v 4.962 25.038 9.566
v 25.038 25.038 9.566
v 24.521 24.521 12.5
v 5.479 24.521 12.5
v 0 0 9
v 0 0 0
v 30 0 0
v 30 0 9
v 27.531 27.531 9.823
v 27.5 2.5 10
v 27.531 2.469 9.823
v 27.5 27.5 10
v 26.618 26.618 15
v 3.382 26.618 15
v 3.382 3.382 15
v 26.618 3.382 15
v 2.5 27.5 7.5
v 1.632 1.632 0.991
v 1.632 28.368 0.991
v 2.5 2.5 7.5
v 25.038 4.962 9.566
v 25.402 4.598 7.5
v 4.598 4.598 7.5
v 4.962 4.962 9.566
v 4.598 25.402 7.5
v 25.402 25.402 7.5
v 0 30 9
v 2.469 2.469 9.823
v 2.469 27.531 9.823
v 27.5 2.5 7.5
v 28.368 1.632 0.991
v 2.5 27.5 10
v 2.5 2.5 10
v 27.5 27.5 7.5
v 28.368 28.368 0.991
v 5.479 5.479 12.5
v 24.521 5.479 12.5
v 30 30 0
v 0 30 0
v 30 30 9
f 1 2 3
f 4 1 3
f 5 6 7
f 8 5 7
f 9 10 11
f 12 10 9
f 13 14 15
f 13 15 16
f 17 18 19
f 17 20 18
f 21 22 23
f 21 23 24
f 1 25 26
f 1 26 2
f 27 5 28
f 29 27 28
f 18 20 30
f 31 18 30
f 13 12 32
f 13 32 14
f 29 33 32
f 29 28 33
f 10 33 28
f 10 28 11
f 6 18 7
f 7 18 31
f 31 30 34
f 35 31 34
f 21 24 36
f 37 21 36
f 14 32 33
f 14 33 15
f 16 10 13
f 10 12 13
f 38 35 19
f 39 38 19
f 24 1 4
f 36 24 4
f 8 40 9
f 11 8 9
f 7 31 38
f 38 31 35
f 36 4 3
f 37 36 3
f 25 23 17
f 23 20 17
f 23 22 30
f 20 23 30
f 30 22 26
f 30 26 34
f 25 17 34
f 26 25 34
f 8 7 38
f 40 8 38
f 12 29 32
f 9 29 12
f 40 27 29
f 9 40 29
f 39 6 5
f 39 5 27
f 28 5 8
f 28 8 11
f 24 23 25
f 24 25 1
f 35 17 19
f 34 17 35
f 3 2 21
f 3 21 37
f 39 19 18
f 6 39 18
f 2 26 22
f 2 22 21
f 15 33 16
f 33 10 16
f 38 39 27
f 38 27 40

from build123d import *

# Parameters (mm, degrees)
F0_W          = 30
F0_H          = 30
F1_DEPTH      = 10
F2_T          = -2.5
F3_SIZE2      = 7.49999
F3_SIZE       = 0.99999
F4_W          = 25
F4_H          = 25
F5_DEPTH      = 5
F5_TAPER      = 10
F6_T          = 2.5
F6_T3_DEPTH   = 12.6321563139
F6_T5_DEPTH   = 12.6321563139
F6_T7_DEPTH   = 12.6321563139
F6_T9_DEPTH   = 12.6321563139
F6_T11_DEPTH  = 5.00001
F6_T13_DEPTH  = 30
F6_T15_DEPTH  = 30
F7_T4_DEPTH   = 45.5703660639
F7_T10_DEPTH  = 45.5703660639
F7_T16_DEPTH  = 45.5703660639
F7_T23_DEPTH  = 45.5703660639
F7_T29_DEPTH  = 45.5703660639
F7_T35_DEPTH  = 45.5703660639
F7_T41_DEPTH  = 45.5703660639
F7_T47_DEPTH  = 45.5703660639
F7_T54_DEPTH  = 45.5703660639
F7_T60_DEPTH  = 45.5703660639
F7_T66_DEPTH  = 45.5703660639
F7_T72_DEPTH  = 45.5703660639
F7_T78_DEPTH  = 45.5703660639
F7_T85_DEPTH  = 45.5703660639
F7_T91_DEPTH  = 45.5703660639
F7_T97_DEPTH  = 45.5703660639
F7_T103_DEPTH = 45.5703660639
F7_T109_DEPTH = 45.5703660639
F7_T116_DEPTH = 45.5703660639
F7_T122_DEPTH = 45.5703660639
F8_C1_SIZE2   = 1
F8_C1_SIZE    = 1.5
F8_C2_SIZE2   = 1
F8_C2_SIZE    = 1.5
F8_C3_SIZE2   = 1
F8_C3_SIZE    = 1.5
F8_C4_SIZE2   = 1
F8_C4_SIZE    = 1.5


# Not quite as in the source:
# - a fillet or chamfer that OpenCascade refuses, or shapes differently, is made with other operations: its cross-section is extruded or revolved along the edge and cut away or added
# - a fillet or chamfer is up to 0.001 mm smaller than in the source, because OpenCascade refuses the exact size
# - a shell that OpenCascade refuses in one call is made with other operations: the cavity is built on its own and cut out


with BuildPart() as f1:
    # F0 (on Top) → F1 (new body)
    with BuildSketch(Plane.XY):
        with Locations((15, 15)):
            Rectangle(F0_W, F0_H)
    extrude(amount=F1_DEPTH)

    # F2
    f2_openings = [f1.faces().sort_by_distance(p)[0] for p in [
        (15, 15, 0),
    ]]
    offset(amount=F2_T, openings=f2_openings)

    # F3 (size 1 and 7.5 in the source; OpenCascade refuses exactly that, so slightly less here)
    f3_edges = [f1.edges().sort_by_distance(p)[0] for p in [
        (27.5, 15, 0),
        (15, 27.5, 0),
        (2.5, 15, 0),
        (15, 2.5, 0),
    ]]
    chamfer(f3_edges, length=F3_SIZE, length2=F3_SIZE2)

    # F4 (on face) → F5 (join)
    with BuildSketch(Plane.XY.offset(10)):
        with Locations((15, 15)):
            Rectangle(F4_W, F4_H)
    extrude(amount=F5_DEPTH, taper=F5_TAPER)

    # F6: shell of thickness 2.5, made by hand


with BuildPart() as f6_core1:
    # F6_t2: copy of F1
    add(f1.part)

    # the walls: a layer under each face that stays
    f6_faces = [f6_core1.faces().sort_by_distance(p)[0] for p in [
        (1, 1, 0),
        (27.999995, 15, 3.749995),
        (15, 2.000005, 3.749995),
        (15, 27.999995, 3.749995),
        (2.000005, 15, 3.749995),
        (0, 15, 5),
        (15, 0, 5),
        (30, 15, 5),
        (15, 30, 5),
        (27.5, 15, 7.499995),
        (15, 2.5, 7.499995),
        (15, 27.5, 7.499995),
        (2.5, 15, 7.499995),
        (2.1428571429, 2.1428571429, 10),
        (27.0591825482, 15, 12.5),
        (15, 27.0591825482, 12.5),
        (2.9408174518, 15, 12.5),
        (15, 2.9408174518, 12.5),
        (15, 15, 15),
    ]]
    thicken(f6_faces, amount=-F6_T, mode=Mode.SUBTRACT)

    # F6_s4 → F6_t3 (cut)
    with BuildSketch(Plane(origin=(0.7910693611, -0.7910693611, -5.9330716286), x_dir=(-0.7071067812, -0.7071067812, 0), z_dir=(-0.1310232599, 0.1310232599, 0.9826829655))):
        Polygon((-21.2132034356, 18.7255916199), (-22.9654636265, 20.5443932655), (-21.2132034356, 22.2663095063), (-19.4609432447, 20.5443932655), align=None)
    extrude(amount=F6_T3_DEPTH, mode=Mode.SUBTRACT)

    # F6_s6 → F6_t5 (cut)
    with BuildSketch(Plane(origin=(1.3060821999, 1.3060821999, -9.7957013952), x_dir=(0.7071067812, -0.7071067812, 0), z_dir=(-0.1310232599, -0.1310232599, 0.9826829655))):
        Polygon((0, 39.5714452805), (1.7522601909, 41.3902469261), (0, 43.1121631669), (-1.7522601909, 41.3902469261), align=None)
    extrude(amount=F6_T5_DEPTH, mode=Mode.SUBTRACT)

    # F6_s8 → F6_t7 (cut)
    with BuildSketch(Plane(origin=(-0.2760565224, -0.2760565224, -2.0704418621), x_dir=(-0.7071067812, 0.7071067812, 0), z_dir=(0.1310232599, 0.1310232599, 0.9826829655))):
        Polygon((0, -2.1202620407), (-1.7522601909, -0.3014603951), (0, 1.4204558457), (1.7522601909, -0.3014603951), align=None)
    extrude(amount=F6_T7_DEPTH, mode=Mode.SUBTRACT)

    # F6_s10 → F6_t9 (cut)
    with BuildSketch(Plane(origin=(-0.7910693611, 0.7910693611, -5.9330716286), x_dir=(0.7071067812, 0.7071067812, 0), z_dir=(0.1310232599, -0.1310232599, 0.9826829655))):
        Polygon((21.2132034356, 18.7255916199), (22.9654636265, 20.5443932655), (21.2132034356, 22.2663095063), (19.4609432447, 20.5443932655), align=None)
    extrude(amount=F6_T9_DEPTH, mode=Mode.SUBTRACT)

    # F6_s12 → F6_t11 (cut)
    with BuildSketch(Plane.XY.offset(4.99999)):
        Polygon((27.475, 2.525), (30, 2.5), (30, 0), (27.5, 0), align=None)
        Polygon((27.475, 27.475), (30, 27.5), (30, 30), (27.5, 30), align=None)
        Polygon((2.525, 2.525), (2.5, 0), (0, 0), (0, 2.5), align=None)
        Polygon((2.525, 27.475), (2.5, 30), (0, 30), (0, 27.5), align=None)
    extrude(amount=F6_T11_DEPTH, mode=Mode.SUBTRACT)

    # F6_s14 → F6_t13 (cut)
    with BuildSketch(Plane.XZ.offset(-30)):
        Polygon((27.5246201938, 10.0293412044), (27.5, 7.5), (25.4022509221, 7.5), (25.0379806175, 9.5658795558), align=None)
        Polygon((2.4753798062, 10.0293412044), (2.5, 7.5), (4.5977490779, 7.5), (4.9620193825, 9.5658795558), align=None)
    extrude(amount=F6_T13_DEPTH, mode=Mode.SUBTRACT)

    # F6_s16 → F6_t15 (cut)
    with BuildSketch(Plane.YZ):
        Polygon((27.5246201938, 10.0293412044), (27.5, 7.5), (25.4022509221, 7.5), (25.0379806175, 9.5658795558), align=None)
        Polygon((2.4753798062, 10.0293412044), (2.5, 7.5), (4.5977490779, 7.5), (4.9620193825, 9.5658795558), align=None)
    extrude(amount=F6_T15_DEPTH, mode=Mode.SUBTRACT)


with BuildPart() as f1_1:
    add(f1.part)

    # what is left inside the walls is the cavity
    f6_cavity = [f6_core1.part.solids().sort_by_distance(p)[0] for p in [
        (15, 11.532583, 7.525),
    ]]
    add(f6_cavity, mode=Mode.SUBTRACT)

    # F7: chamfer of 1 x 3 on 4 edges, made by hand


with BuildPart() as f7_tool2:
    # F7_s3 → F7_t4 (new body)
    with BuildSketch(Plane.XZ.offset(7.785183032)):
        Polygon((30, 9), (27, 10), (30, 10), align=None)
    extrude(amount=-F7_T4_DEPTH)

    split(bisect_by=Plane(origin=(28.3808742524, 0, 5.0043138668), x_dir=(0, 1, 0), z_dir=(0.984807753, 0, 0.1736481777)), keep=Keep.TOP)

    split(bisect_by=Plane(origin=(0, 0.7145150594, -0.1259882831), x_dir=(1, 0, 0), z_dir=(0, -0.984807753, 0.1736481777)), keep=Keep.TOP)


with BuildPart() as f1_2:
    add(f1_1.part)

    # F7_t1: cut F7_tool2
    add(f7_tool2.part, mode=Mode.SUBTRACT)


with BuildPart() as f7_tool8:
    # F7_s9 → F7_t10 (new body)
    with BuildSketch(Plane.XZ.offset(7.785183032)):
        Polygon((30, 9), (27, 10), (30, 10), align=None)
    extrude(amount=-F7_T10_DEPTH)

    split(bisect_by=Plane(origin=(28.3808742524, 0, 5.0043138668), x_dir=(0, 1, 0), z_dir=(-0.984807753, 0, -0.1736481777)), keep=Keep.TOP)

    split(bisect_by=Plane(origin=(0, 0.7145150594, -0.1259882831), x_dir=(1, 0, 0), z_dir=(0, -0.984807753, 0.1736481777)), keep=Keep.TOP)


with BuildPart() as f1_3:
    add(f1_2.part)

    # F7_t7: cut F7_tool8
    add(f7_tool8.part, mode=Mode.SUBTRACT)


with BuildPart() as f7_tool14:
    # F7_s15 → F7_t16 (new body)
    with BuildSketch(Plane.XZ.offset(7.785183032)):
        Polygon((30, 9), (27, 10), (30, 10), align=None)
    extrude(amount=-F7_T16_DEPTH)

    split(bisect_by=Plane(origin=(28.3808742524, 0, 5.0043138668), x_dir=(0, 1, 0), z_dir=(0.984807753, 0, 0.1736481777)), keep=Keep.TOP)

    split(bisect_by=Plane(origin=(0, 28.3808742524, 5.0043138668), x_dir=(1, 0, 0), z_dir=(0, -0.984807753, -0.1736481777)), keep=Keep.TOP)

    split(bisect_by=Plane(origin=(0, 0.7145150594, -0.1259882831), x_dir=(1, 0, 0), z_dir=(0, 0.984807753, -0.1736481777)), keep=Keep.TOP)


with BuildPart() as f1_4:
    add(f1_3.part)

    # F7_t13: cut F7_tool14
    add(f7_tool14.part, mode=Mode.SUBTRACT)


with BuildPart() as f7_tool21:
    # F7_s22 → F7_t23 (new body)
    with BuildSketch(Plane.XZ.offset(7.785183032)):
        Polygon((30, 9), (27, 10), (30, 10), align=None)
    extrude(amount=-F7_T23_DEPTH)

    split(bisect_by=Plane(origin=(28.3808742524, 0, 5.0043138668), x_dir=(0, 1, 0), z_dir=(0.984807753, 0, 0.1736481777)), keep=Keep.TOP)

    split(bisect_by=Plane(origin=(0, 28.3808742524, 5.0043138668), x_dir=(1, 0, 0), z_dir=(0, 0.984807753, 0.1736481777)), keep=Keep.TOP)


with BuildPart() as f1_5:
    add(f1_4.part)

    # F7_t20: cut F7_tool21
    add(f7_tool21.part, mode=Mode.SUBTRACT)


with BuildPart() as f7_tool27:
    # F7_s28 → F7_t29 (new body)
    with BuildSketch(Plane.XZ.offset(7.785183032)):
        Polygon((30, 9), (27, 10), (30, 10), align=None)
    extrude(amount=-F7_T29_DEPTH)

    split(bisect_by=Plane(origin=(28.3808742524, 0, 5.0043138668), x_dir=(0, 1, 0), z_dir=(-0.984807753, 0, -0.1736481777)), keep=Keep.TOP)

    split(bisect_by=Plane(origin=(0, 28.3808742524, 5.0043138668), x_dir=(1, 0, 0), z_dir=(0, 0.984807753, 0.1736481777)), keep=Keep.TOP)


with BuildPart() as f1_6:
    add(f1_5.part)

    # F7_t26: cut F7_tool27
    add(f7_tool27.part, mode=Mode.SUBTRACT)


with BuildPart() as f7_tool33:
    # F7_s34 → F7_t35 (new body)
    with BuildSketch(Plane.YZ.offset(-7.785183032)):
        Polygon((0, 9), (3, 10), (0, 10), align=None)
    extrude(amount=F7_T35_DEPTH)

    split(bisect_by=Plane(origin=(0.7145150594, 0, -0.1259882831), x_dir=(0, 1, 0), z_dir=(-0.984807753, 0, 0.1736481777)), keep=Keep.TOP)

    split(bisect_by=Plane(origin=(0, 0.7145150594, -0.1259882831), x_dir=(1, 0, 0), z_dir=(0, -0.984807753, 0.1736481777)), keep=Keep.TOP)


with BuildPart() as f1_7:
    add(f1_6.part)

    # F7_t32: cut F7_tool33
    add(f7_tool33.part, mode=Mode.SUBTRACT)


with BuildPart() as f7_tool39:
    # F7_s40 → F7_t41 (new body)
    with BuildSketch(Plane.YZ.offset(-7.785183032)):
        Polygon((0, 9), (3, 10), (0, 10), align=None)
    extrude(amount=F7_T41_DEPTH)

    split(bisect_by=Plane(origin=(0.7145150594, 0, -0.1259882831), x_dir=(0, 1, 0), z_dir=(-0.984807753, 0, 0.1736481777)), keep=Keep.TOP)

    split(bisect_by=Plane(origin=(0, 0.7145150594, -0.1259882831), x_dir=(1, 0, 0), z_dir=(0, 0.984807753, -0.1736481777)), keep=Keep.TOP)


with BuildPart() as f1_8:
    add(f1_7.part)

    # F7_t38: cut F7_tool39
    add(f7_tool39.part, mode=Mode.SUBTRACT)


with BuildPart() as f7_tool45:
    # F7_s46 → F7_t47 (new body)
    with BuildSketch(Plane.YZ.offset(-7.785183032)):
        Polygon((0, 9), (3, 10), (0, 10), align=None)
    extrude(amount=F7_T47_DEPTH)

    split(bisect_by=Plane(origin=(28.3808742524, 0, 5.0043138668), x_dir=(0, 1, 0), z_dir=(-0.984807753, 0, -0.1736481777)), keep=Keep.TOP)

    split(bisect_by=Plane(origin=(0.7145150594, 0, -0.1259882831), x_dir=(0, 1, 0), z_dir=(0.984807753, 0, -0.1736481777)), keep=Keep.TOP)

    split(bisect_by=Plane(origin=(0, 0.7145150594, -0.1259882831), x_dir=(1, 0, 0), z_dir=(0, -0.984807753, 0.1736481777)), keep=Keep.TOP)


with BuildPart() as f1_9:
    add(f1_8.part)

    # F7_t44: cut F7_tool45
    add(f7_tool45.part, mode=Mode.SUBTRACT)


with BuildPart() as f7_tool52:
    # F7_s53 → F7_t54 (new body)
    with BuildSketch(Plane.YZ.offset(-7.785183032)):
        Polygon((0, 9), (3, 10), (0, 10), align=None)
    extrude(amount=F7_T54_DEPTH)

    split(bisect_by=Plane(origin=(28.3808742524, 0, 5.0043138668), x_dir=(0, 1, 0), z_dir=(0.984807753, 0, 0.1736481777)), keep=Keep.TOP)

    split(bisect_by=Plane(origin=(0, 0.7145150594, -0.1259882831), x_dir=(1, 0, 0), z_dir=(0, -0.984807753, 0.1736481777)), keep=Keep.TOP)


with BuildPart() as f1_10:
    add(f1_9.part)

    # F7_t51: cut F7_tool52
    add(f7_tool52.part, mode=Mode.SUBTRACT)


with BuildPart() as f7_tool58:
    # F7_s59 → F7_t60 (new body)
    with BuildSketch(Plane.YZ.offset(-7.785183032)):
        Polygon((0, 9), (3, 10), (0, 10), align=None)
    extrude(amount=F7_T60_DEPTH)

    split(bisect_by=Plane(origin=(28.3808742524, 0, 5.0043138668), x_dir=(0, 1, 0), z_dir=(0.984807753, 0, 0.1736481777)), keep=Keep.TOP)

    split(bisect_by=Plane(origin=(0, 0.7145150594, -0.1259882831), x_dir=(1, 0, 0), z_dir=(0, 0.984807753, -0.1736481777)), keep=Keep.TOP)


with BuildPart() as f1_11:
    add(f1_10.part)

    # F7_t57: cut F7_tool58
    add(f7_tool58.part, mode=Mode.SUBTRACT)


with BuildPart() as f7_tool64:
    # F7_s65 → F7_t66 (new body)
    with BuildSketch(Plane.XZ.offset(-37.785183032)):
        Polygon((0, 9), (3, 10), (0, 10), align=None)
    extrude(amount=F7_T66_DEPTH)

    split(bisect_by=Plane(origin=(0, 28.3808742524, 5.0043138668), x_dir=(1, 0, 0), z_dir=(0, 0.984807753, 0.1736481777)), keep=Keep.TOP)

    split(bisect_by=Plane(origin=(0.7145150594, 0, -0.1259882831), x_dir=(0, 1, 0), z_dir=(-0.984807753, 0, 0.1736481777)), keep=Keep.TOP)


with BuildPart() as f1_12:
    add(f1_11.part)

    # F7_t63: cut F7_tool64
    add(f7_tool64.part, mode=Mode.SUBTRACT)


with BuildPart() as f7_tool70:
    # F7_s71 → F7_t72 (new body)
    with BuildSketch(Plane.XZ.offset(-37.785183032)):
        Polygon((0, 9), (3, 10), (0, 10), align=None)
    extrude(amount=F7_T72_DEPTH)

    split(bisect_by=Plane(origin=(0, 28.3808742524, 5.0043138668), x_dir=(1, 0, 0), z_dir=(0, 0.984807753, 0.1736481777)), keep=Keep.TOP)

    split(bisect_by=Plane(origin=(0.7145150594, 0, -0.1259882831), x_dir=(0, 1, 0), z_dir=(0.984807753, 0, -0.1736481777)), keep=Keep.TOP)


with BuildPart() as f1_13:
    add(f1_12.part)

    # F7_t69: cut F7_tool70
    add(f7_tool70.part, mode=Mode.SUBTRACT)


with BuildPart() as f7_tool76:
    # F7_s77 → F7_t78 (new body)
    with BuildSketch(Plane.XZ.offset(-37.785183032)):
        Polygon((0, 9), (3, 10), (0, 10), align=None)
    extrude(amount=F7_T78_DEPTH)

    split(bisect_by=Plane(origin=(0, 28.3808742524, 5.0043138668), x_dir=(1, 0, 0), z_dir=(0, -0.984807753, -0.1736481777)), keep=Keep.TOP)

    split(bisect_by=Plane(origin=(0.7145150594, 0, -0.1259882831), x_dir=(0, 1, 0), z_dir=(-0.984807753, 0, 0.1736481777)), keep=Keep.TOP)

    split(bisect_by=Plane(origin=(0, 0.7145150594, -0.1259882831), x_dir=(1, 0, 0), z_dir=(0, 0.984807753, -0.1736481777)), keep=Keep.TOP)


with BuildPart() as f1_14:
    add(f1_13.part)

    # F7_t75: cut F7_tool76
    add(f7_tool76.part, mode=Mode.SUBTRACT)


with BuildPart() as f7_tool83:
    # F7_s84 → F7_t85 (new body)
    with BuildSketch(Plane.XZ.offset(-37.785183032)):
        Polygon((0, 9), (3, 10), (0, 10), align=None)
    extrude(amount=F7_T85_DEPTH)

    split(bisect_by=Plane(origin=(0.7145150594, 0, -0.1259882831), x_dir=(0, 1, 0), z_dir=(-0.984807753, 0, 0.1736481777)), keep=Keep.TOP)

    split(bisect_by=Plane(origin=(0, 0.7145150594, -0.1259882831), x_dir=(1, 0, 0), z_dir=(0, -0.984807753, 0.1736481777)), keep=Keep.TOP)


with BuildPart() as f1_15:
    add(f1_14.part)

    # F7_t82: cut F7_tool83
    add(f7_tool83.part, mode=Mode.SUBTRACT)


with BuildPart() as f7_tool89:
    # F7_s90 → F7_t91 (new body)
    with BuildSketch(Plane.XZ.offset(-37.785183032)):
        Polygon((0, 9), (3, 10), (0, 10), align=None)
    extrude(amount=F7_T91_DEPTH)

    split(bisect_by=Plane(origin=(0.7145150594, 0, -0.1259882831), x_dir=(0, 1, 0), z_dir=(0.984807753, 0, -0.1736481777)), keep=Keep.TOP)

    split(bisect_by=Plane(origin=(0, 0.7145150594, -0.1259882831), x_dir=(1, 0, 0), z_dir=(0, -0.984807753, 0.1736481777)), keep=Keep.TOP)


with BuildPart() as f1_16:
    add(f1_15.part)

    # F7_t88: cut F7_tool89
    add(f7_tool89.part, mode=Mode.SUBTRACT)


with BuildPart() as f7_tool95:
    # F7_s96 → F7_t97 (new body)
    with BuildSketch(Plane.YZ.offset(37.785183032)):
        Polygon((30, 9), (27, 10), (30, 10), align=None)
    extrude(amount=-F7_T97_DEPTH)

    split(bisect_by=Plane(origin=(28.3808742524, 0, 5.0043138668), x_dir=(0, 1, 0), z_dir=(0.984807753, 0, 0.1736481777)), keep=Keep.TOP)

    split(bisect_by=Plane(origin=(0, 28.3808742524, 5.0043138668), x_dir=(1, 0, 0), z_dir=(0, 0.984807753, 0.1736481777)), keep=Keep.TOP)


with BuildPart() as f1_17:
    add(f1_16.part)

    # F7_t94: cut F7_tool95
    add(f7_tool95.part, mode=Mode.SUBTRACT)


with BuildPart() as f7_tool101:
    # F7_s102 → F7_t103 (new body)
    with BuildSketch(Plane.YZ.offset(37.785183032)):
        Polygon((30, 9), (27, 10), (30, 10), align=None)
    extrude(amount=-F7_T103_DEPTH)

    split(bisect_by=Plane(origin=(28.3808742524, 0, 5.0043138668), x_dir=(0, 1, 0), z_dir=(0.984807753, 0, 0.1736481777)), keep=Keep.TOP)

    split(bisect_by=Plane(origin=(0, 28.3808742524, 5.0043138668), x_dir=(1, 0, 0), z_dir=(0, -0.984807753, -0.1736481777)), keep=Keep.TOP)


with BuildPart() as f1_18:
    add(f1_17.part)

    # F7_t100: cut F7_tool101
    add(f7_tool101.part, mode=Mode.SUBTRACT)


with BuildPart() as f7_tool107:
    # F7_s108 → F7_t109 (new body)
    with BuildSketch(Plane.YZ.offset(37.785183032)):
        Polygon((30, 9), (27, 10), (30, 10), align=None)
    extrude(amount=-F7_T109_DEPTH)

    split(bisect_by=Plane(origin=(28.3808742524, 0, 5.0043138668), x_dir=(0, 1, 0), z_dir=(-0.984807753, 0, -0.1736481777)), keep=Keep.TOP)

    split(bisect_by=Plane(origin=(0, 28.3808742524, 5.0043138668), x_dir=(1, 0, 0), z_dir=(0, 0.984807753, 0.1736481777)), keep=Keep.TOP)

    split(bisect_by=Plane(origin=(0.7145150594, 0, -0.1259882831), x_dir=(0, 1, 0), z_dir=(0.984807753, 0, -0.1736481777)), keep=Keep.TOP)


with BuildPart() as f1_19:
    add(f1_18.part)

    # F7_t106: cut F7_tool107
    add(f7_tool107.part, mode=Mode.SUBTRACT)


with BuildPart() as f7_tool114:
    # F7_s115 → F7_t116 (new body)
    with BuildSketch(Plane.YZ.offset(37.785183032)):
        Polygon((30, 9), (27, 10), (30, 10), align=None)
    extrude(amount=-F7_T116_DEPTH)

    split(bisect_by=Plane(origin=(0, 28.3808742524, 5.0043138668), x_dir=(1, 0, 0), z_dir=(0, 0.984807753, 0.1736481777)), keep=Keep.TOP)

    split(bisect_by=Plane(origin=(0.7145150594, 0, -0.1259882831), x_dir=(0, 1, 0), z_dir=(-0.984807753, 0, 0.1736481777)), keep=Keep.TOP)


with BuildPart() as f1_20:
    add(f1_19.part)

    # F7_t113: cut F7_tool114
    add(f7_tool114.part, mode=Mode.SUBTRACT)


with BuildPart() as f7_tool120:
    # F7_s121 → F7_t122 (new body)
    with BuildSketch(Plane.YZ.offset(37.785183032)):
        Polygon((30, 9), (27, 10), (30, 10), align=None)
    extrude(amount=-F7_T122_DEPTH)

    split(bisect_by=Plane(origin=(0, 28.3808742524, 5.0043138668), x_dir=(1, 0, 0), z_dir=(0, -0.984807753, -0.1736481777)), keep=Keep.TOP)

    split(bisect_by=Plane(origin=(0.7145150594, 0, -0.1259882831), x_dir=(0, 1, 0), z_dir=(-0.984807753, 0, 0.1736481777)), keep=Keep.TOP)


with BuildPart() as f1_21:
    add(f1_20.part)

    # F7_t119: cut F7_tool120
    add(f7_tool120.part, mode=Mode.SUBTRACT)

    # F8: chamfer of 1 x 1.5 on 4 edges, made by hand

    # F8_c1
    f8_c1_edges = [f1_21.edges().sort_by_distance(p)[0] for p in [
        (28.49999, 15, 0),
    ]]
    f8_c1_side = f1_21.faces().sort_by_distance((28.51999, 15, 0))[0]
    chamfer(f8_c1_edges, length=F8_C1_SIZE, length2=F8_C1_SIZE2, reference=f8_c1_side)

    # F8_c2
    f8_c2_edges = [f1_21.edges().sort_by_distance(p)[0] for p in [
        (15, 1.50001, 0),
    ]]
    f8_c2_side = f1_21.faces().sort_by_distance((15, 1.48001, 0))[0]
    chamfer(f8_c2_edges, length=F8_C2_SIZE, length2=F8_C2_SIZE2, reference=f8_c2_side)

    # F8_c3
    f8_c3_edges = [f1_21.edges().sort_by_distance(p)[0] for p in [
        (15, 28.49999, 0),
    ]]
    f8_c3_side = f1_21.faces().sort_by_distance((15, 28.51999, 0))[0]
    chamfer(f8_c3_edges, length=F8_C3_SIZE, length2=F8_C3_SIZE2, reference=f8_c3_side)

    # F8_c4
    f8_c4_edges = [f1_21.edges().sort_by_distance(p)[0] for p in [
        (1.50001, 15, 0),
    ]]
    f8_c4_side = f1_21.faces().sort_by_distance((1.48001, 15, 0))[0]
    chamfer(f8_c4_edges, length=F8_C4_SIZE, length2=F8_C4_SIZE2, reference=f8_c4_side)


solid = f1_21.part
